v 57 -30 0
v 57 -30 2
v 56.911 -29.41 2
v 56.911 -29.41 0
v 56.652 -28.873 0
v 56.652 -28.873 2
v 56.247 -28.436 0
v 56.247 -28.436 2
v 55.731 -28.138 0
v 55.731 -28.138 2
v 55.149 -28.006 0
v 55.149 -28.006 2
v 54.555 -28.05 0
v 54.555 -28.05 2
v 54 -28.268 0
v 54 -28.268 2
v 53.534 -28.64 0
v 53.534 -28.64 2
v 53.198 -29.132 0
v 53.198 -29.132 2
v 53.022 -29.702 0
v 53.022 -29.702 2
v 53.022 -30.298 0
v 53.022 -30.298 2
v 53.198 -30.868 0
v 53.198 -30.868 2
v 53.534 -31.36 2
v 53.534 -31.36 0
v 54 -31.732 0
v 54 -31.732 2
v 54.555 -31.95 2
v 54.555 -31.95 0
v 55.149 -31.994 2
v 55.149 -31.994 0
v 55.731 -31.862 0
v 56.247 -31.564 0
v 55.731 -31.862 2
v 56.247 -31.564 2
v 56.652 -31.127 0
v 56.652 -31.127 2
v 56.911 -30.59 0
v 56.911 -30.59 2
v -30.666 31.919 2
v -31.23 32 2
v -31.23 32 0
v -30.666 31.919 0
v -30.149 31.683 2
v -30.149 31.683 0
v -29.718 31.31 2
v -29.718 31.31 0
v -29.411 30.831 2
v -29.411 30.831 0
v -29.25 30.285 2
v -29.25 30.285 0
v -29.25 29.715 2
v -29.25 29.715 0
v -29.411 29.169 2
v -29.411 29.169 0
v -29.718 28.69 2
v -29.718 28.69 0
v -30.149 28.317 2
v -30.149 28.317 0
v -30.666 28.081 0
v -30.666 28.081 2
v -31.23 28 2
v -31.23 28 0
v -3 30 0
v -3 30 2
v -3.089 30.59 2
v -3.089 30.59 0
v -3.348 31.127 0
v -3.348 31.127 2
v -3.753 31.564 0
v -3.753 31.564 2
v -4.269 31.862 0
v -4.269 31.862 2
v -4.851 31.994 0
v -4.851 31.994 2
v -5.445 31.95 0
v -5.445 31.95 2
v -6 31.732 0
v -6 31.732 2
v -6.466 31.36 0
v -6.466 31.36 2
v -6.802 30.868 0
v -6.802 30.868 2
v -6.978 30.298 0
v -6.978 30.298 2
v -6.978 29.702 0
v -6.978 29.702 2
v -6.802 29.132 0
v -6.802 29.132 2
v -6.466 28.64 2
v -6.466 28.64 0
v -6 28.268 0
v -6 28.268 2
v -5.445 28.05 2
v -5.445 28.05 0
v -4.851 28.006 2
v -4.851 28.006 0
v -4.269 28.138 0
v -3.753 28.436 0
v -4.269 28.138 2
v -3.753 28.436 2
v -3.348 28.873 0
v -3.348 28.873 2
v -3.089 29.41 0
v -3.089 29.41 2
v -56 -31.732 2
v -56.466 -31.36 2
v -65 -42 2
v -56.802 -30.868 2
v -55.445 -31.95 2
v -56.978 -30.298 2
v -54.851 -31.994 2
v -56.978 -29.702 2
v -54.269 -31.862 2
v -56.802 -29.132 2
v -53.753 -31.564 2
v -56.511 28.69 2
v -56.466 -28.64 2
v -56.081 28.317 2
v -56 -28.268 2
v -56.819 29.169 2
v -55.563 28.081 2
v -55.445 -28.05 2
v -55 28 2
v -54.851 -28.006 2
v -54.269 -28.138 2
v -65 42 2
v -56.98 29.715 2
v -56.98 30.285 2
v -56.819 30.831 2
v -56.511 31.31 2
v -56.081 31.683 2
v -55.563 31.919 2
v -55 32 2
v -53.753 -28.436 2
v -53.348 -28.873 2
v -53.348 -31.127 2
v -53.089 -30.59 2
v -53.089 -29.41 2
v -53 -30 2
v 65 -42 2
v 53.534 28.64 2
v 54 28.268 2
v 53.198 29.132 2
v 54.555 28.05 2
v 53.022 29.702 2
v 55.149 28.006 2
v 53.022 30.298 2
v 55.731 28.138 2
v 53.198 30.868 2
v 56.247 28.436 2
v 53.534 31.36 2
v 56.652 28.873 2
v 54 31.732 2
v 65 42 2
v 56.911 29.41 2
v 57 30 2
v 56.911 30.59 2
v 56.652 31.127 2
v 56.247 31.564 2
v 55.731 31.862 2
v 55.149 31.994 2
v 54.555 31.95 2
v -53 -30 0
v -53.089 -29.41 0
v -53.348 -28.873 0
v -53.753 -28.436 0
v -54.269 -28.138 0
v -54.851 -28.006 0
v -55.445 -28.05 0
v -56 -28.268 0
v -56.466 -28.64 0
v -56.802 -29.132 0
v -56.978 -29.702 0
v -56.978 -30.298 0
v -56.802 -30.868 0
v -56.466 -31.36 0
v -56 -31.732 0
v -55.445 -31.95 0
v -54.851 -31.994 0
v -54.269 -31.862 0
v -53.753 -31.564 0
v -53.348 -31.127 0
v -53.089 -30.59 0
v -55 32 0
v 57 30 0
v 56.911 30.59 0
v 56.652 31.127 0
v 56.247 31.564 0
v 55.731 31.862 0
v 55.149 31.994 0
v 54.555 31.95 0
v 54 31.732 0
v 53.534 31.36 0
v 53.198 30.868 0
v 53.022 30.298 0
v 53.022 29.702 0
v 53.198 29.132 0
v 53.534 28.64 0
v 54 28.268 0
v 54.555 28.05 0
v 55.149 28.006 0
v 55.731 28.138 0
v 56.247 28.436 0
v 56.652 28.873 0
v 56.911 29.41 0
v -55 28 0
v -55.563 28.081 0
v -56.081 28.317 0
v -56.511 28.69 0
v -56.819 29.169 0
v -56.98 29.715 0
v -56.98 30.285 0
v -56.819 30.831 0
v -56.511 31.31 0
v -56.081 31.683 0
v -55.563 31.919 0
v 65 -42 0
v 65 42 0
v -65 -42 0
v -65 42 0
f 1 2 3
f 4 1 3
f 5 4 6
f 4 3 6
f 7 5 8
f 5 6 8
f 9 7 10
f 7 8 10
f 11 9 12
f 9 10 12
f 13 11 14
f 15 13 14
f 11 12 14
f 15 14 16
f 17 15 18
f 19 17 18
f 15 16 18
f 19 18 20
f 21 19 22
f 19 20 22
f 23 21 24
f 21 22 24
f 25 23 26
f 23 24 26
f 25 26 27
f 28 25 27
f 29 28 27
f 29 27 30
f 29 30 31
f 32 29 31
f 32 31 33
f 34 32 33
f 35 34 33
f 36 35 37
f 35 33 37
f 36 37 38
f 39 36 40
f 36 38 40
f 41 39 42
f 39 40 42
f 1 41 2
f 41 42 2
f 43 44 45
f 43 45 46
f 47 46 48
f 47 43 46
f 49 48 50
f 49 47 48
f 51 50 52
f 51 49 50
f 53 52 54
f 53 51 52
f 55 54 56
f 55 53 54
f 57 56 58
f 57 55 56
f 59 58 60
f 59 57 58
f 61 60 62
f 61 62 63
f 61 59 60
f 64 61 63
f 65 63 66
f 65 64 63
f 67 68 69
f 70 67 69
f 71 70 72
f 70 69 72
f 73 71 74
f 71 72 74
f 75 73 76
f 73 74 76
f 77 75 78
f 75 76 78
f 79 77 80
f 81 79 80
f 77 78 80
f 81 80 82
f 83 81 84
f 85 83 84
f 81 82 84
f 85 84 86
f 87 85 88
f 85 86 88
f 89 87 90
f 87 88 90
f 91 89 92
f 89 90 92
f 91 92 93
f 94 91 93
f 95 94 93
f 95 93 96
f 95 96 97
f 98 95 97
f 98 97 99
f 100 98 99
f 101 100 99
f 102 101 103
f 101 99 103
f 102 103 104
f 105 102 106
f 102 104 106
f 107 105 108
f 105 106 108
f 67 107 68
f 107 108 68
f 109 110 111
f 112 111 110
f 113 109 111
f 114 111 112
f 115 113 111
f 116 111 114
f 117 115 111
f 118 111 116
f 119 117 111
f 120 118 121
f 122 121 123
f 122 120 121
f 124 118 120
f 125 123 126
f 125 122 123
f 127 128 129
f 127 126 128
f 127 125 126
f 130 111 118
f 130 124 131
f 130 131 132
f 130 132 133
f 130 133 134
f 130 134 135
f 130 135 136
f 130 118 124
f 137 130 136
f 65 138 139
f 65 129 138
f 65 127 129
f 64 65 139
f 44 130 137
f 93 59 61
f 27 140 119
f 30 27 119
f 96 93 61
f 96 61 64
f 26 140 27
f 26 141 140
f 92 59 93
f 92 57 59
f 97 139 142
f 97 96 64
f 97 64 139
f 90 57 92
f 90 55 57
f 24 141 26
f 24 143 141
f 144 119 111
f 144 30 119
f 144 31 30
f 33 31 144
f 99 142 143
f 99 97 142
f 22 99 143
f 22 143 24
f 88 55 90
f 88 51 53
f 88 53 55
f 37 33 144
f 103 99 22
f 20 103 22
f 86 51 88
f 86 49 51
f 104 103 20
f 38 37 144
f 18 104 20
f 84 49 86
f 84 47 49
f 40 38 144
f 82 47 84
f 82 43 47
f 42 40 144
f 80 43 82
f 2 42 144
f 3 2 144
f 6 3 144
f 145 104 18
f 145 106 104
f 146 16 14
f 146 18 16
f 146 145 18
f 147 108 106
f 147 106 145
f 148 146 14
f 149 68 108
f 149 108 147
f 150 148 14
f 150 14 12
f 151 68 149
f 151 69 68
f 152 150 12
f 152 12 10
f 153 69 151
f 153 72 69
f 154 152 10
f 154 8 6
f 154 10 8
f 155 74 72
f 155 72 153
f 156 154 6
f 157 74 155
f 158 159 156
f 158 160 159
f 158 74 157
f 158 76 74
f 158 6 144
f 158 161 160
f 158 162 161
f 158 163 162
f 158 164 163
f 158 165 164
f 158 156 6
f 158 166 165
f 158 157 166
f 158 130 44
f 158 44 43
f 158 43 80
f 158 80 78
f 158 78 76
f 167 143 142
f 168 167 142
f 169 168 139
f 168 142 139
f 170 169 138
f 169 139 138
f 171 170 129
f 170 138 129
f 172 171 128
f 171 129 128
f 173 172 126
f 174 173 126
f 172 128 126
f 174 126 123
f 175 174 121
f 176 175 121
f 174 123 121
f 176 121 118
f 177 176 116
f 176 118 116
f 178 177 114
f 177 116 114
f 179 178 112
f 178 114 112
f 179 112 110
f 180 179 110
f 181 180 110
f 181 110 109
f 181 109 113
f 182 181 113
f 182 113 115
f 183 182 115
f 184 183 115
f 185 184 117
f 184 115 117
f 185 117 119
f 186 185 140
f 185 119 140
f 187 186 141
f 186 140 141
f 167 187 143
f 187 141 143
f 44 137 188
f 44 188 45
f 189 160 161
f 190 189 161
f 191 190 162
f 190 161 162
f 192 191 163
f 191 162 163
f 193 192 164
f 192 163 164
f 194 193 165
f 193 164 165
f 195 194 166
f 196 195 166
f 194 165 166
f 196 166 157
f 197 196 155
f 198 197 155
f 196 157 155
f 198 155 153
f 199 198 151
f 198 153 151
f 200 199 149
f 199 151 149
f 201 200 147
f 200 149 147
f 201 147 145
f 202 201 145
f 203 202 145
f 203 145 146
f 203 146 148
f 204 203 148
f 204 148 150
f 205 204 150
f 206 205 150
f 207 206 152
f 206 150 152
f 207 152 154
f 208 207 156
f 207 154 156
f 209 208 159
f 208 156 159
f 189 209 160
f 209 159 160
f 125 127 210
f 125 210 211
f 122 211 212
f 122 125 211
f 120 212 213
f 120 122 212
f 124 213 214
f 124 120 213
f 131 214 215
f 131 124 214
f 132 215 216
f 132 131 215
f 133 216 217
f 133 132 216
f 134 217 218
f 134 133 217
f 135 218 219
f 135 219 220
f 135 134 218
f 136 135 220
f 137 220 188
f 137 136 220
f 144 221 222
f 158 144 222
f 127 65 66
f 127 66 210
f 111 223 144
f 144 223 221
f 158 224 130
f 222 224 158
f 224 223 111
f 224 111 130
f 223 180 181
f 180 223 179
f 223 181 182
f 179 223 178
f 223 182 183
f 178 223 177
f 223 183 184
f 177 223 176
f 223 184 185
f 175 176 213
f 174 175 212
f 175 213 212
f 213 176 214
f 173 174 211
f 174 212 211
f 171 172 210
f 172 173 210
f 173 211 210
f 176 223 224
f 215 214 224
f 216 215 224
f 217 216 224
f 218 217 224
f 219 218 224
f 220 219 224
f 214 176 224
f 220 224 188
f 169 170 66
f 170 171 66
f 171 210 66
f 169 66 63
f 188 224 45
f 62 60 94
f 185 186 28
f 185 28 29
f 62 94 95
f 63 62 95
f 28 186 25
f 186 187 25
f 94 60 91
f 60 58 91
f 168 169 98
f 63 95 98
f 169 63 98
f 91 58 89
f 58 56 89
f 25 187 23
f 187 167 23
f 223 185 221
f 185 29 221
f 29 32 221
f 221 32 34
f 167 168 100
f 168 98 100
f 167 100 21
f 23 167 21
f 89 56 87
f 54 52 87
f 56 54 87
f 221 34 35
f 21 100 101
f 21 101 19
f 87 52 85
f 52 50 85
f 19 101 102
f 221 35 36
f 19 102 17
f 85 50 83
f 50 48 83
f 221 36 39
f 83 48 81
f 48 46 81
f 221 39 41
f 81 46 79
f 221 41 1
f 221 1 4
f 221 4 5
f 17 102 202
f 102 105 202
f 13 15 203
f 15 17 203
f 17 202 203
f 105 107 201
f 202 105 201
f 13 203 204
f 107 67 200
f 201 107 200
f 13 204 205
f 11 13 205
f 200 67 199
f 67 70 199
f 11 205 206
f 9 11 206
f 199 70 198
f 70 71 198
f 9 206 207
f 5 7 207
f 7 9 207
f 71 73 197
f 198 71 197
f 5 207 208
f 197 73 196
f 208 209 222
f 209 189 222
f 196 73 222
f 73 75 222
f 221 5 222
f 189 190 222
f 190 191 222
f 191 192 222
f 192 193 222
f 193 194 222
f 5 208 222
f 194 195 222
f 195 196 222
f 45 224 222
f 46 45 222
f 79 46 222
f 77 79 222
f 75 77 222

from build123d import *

# Parameters (mm, degrees)
SKETCH1_W           = 130
SKETCH1_H           = 84
BOSS_EXTRUDE1_DEPTH = 2
SKETCH2_R           = 2
CUT_EXTRUDE1_DEPTH  = 2
CUT_EXTRUDE2_DEPTH  = 2


with BuildPart() as part:
    # Sketch1 → Boss-Extrude1 (new body)
    with BuildSketch(Plane.XY):
        Rectangle(SKETCH1_W, SKETCH1_H)
    extrude(amount=BOSS_EXTRUDE1_DEPTH)

    # Sketch2 → Cut-Extrude1 (cut)
    with BuildSketch(Plane.XY.offset(2)):
        with Locations((55, -30)):
            Circle(SKETCH2_R)
        with Locations((-55, -30)):
            Circle(SKETCH2_R)
        with Locations((55, 30)):
            Circle(SKETCH2_R)
        with Locations((-5, 30)):
            Circle(SKETCH2_R)
    extrude(amount=-CUT_EXTRUDE1_DEPTH, mode=Mode.SUBTRACT)

    # Sketch3 → Cut-Extrude2 (cut)
    with BuildSketch(Plane.XY.offset(2)):
        with BuildLine():
            Line((-55, 32), (-31.229864945, 32))
            ThreePointArc((-31.229864945, 32), (-29.229864945, 30), (-31.229864945, 28))
            Line((-31.229864945, 28), (-55, 28))
            ThreePointArc((-55, 28), (-57, 30), (-55, 32))
        make_face()
    extrude(amount=-CUT_EXTRUDE2_DEPTH, mode=Mode.SUBTRACT)


solid = part.part
